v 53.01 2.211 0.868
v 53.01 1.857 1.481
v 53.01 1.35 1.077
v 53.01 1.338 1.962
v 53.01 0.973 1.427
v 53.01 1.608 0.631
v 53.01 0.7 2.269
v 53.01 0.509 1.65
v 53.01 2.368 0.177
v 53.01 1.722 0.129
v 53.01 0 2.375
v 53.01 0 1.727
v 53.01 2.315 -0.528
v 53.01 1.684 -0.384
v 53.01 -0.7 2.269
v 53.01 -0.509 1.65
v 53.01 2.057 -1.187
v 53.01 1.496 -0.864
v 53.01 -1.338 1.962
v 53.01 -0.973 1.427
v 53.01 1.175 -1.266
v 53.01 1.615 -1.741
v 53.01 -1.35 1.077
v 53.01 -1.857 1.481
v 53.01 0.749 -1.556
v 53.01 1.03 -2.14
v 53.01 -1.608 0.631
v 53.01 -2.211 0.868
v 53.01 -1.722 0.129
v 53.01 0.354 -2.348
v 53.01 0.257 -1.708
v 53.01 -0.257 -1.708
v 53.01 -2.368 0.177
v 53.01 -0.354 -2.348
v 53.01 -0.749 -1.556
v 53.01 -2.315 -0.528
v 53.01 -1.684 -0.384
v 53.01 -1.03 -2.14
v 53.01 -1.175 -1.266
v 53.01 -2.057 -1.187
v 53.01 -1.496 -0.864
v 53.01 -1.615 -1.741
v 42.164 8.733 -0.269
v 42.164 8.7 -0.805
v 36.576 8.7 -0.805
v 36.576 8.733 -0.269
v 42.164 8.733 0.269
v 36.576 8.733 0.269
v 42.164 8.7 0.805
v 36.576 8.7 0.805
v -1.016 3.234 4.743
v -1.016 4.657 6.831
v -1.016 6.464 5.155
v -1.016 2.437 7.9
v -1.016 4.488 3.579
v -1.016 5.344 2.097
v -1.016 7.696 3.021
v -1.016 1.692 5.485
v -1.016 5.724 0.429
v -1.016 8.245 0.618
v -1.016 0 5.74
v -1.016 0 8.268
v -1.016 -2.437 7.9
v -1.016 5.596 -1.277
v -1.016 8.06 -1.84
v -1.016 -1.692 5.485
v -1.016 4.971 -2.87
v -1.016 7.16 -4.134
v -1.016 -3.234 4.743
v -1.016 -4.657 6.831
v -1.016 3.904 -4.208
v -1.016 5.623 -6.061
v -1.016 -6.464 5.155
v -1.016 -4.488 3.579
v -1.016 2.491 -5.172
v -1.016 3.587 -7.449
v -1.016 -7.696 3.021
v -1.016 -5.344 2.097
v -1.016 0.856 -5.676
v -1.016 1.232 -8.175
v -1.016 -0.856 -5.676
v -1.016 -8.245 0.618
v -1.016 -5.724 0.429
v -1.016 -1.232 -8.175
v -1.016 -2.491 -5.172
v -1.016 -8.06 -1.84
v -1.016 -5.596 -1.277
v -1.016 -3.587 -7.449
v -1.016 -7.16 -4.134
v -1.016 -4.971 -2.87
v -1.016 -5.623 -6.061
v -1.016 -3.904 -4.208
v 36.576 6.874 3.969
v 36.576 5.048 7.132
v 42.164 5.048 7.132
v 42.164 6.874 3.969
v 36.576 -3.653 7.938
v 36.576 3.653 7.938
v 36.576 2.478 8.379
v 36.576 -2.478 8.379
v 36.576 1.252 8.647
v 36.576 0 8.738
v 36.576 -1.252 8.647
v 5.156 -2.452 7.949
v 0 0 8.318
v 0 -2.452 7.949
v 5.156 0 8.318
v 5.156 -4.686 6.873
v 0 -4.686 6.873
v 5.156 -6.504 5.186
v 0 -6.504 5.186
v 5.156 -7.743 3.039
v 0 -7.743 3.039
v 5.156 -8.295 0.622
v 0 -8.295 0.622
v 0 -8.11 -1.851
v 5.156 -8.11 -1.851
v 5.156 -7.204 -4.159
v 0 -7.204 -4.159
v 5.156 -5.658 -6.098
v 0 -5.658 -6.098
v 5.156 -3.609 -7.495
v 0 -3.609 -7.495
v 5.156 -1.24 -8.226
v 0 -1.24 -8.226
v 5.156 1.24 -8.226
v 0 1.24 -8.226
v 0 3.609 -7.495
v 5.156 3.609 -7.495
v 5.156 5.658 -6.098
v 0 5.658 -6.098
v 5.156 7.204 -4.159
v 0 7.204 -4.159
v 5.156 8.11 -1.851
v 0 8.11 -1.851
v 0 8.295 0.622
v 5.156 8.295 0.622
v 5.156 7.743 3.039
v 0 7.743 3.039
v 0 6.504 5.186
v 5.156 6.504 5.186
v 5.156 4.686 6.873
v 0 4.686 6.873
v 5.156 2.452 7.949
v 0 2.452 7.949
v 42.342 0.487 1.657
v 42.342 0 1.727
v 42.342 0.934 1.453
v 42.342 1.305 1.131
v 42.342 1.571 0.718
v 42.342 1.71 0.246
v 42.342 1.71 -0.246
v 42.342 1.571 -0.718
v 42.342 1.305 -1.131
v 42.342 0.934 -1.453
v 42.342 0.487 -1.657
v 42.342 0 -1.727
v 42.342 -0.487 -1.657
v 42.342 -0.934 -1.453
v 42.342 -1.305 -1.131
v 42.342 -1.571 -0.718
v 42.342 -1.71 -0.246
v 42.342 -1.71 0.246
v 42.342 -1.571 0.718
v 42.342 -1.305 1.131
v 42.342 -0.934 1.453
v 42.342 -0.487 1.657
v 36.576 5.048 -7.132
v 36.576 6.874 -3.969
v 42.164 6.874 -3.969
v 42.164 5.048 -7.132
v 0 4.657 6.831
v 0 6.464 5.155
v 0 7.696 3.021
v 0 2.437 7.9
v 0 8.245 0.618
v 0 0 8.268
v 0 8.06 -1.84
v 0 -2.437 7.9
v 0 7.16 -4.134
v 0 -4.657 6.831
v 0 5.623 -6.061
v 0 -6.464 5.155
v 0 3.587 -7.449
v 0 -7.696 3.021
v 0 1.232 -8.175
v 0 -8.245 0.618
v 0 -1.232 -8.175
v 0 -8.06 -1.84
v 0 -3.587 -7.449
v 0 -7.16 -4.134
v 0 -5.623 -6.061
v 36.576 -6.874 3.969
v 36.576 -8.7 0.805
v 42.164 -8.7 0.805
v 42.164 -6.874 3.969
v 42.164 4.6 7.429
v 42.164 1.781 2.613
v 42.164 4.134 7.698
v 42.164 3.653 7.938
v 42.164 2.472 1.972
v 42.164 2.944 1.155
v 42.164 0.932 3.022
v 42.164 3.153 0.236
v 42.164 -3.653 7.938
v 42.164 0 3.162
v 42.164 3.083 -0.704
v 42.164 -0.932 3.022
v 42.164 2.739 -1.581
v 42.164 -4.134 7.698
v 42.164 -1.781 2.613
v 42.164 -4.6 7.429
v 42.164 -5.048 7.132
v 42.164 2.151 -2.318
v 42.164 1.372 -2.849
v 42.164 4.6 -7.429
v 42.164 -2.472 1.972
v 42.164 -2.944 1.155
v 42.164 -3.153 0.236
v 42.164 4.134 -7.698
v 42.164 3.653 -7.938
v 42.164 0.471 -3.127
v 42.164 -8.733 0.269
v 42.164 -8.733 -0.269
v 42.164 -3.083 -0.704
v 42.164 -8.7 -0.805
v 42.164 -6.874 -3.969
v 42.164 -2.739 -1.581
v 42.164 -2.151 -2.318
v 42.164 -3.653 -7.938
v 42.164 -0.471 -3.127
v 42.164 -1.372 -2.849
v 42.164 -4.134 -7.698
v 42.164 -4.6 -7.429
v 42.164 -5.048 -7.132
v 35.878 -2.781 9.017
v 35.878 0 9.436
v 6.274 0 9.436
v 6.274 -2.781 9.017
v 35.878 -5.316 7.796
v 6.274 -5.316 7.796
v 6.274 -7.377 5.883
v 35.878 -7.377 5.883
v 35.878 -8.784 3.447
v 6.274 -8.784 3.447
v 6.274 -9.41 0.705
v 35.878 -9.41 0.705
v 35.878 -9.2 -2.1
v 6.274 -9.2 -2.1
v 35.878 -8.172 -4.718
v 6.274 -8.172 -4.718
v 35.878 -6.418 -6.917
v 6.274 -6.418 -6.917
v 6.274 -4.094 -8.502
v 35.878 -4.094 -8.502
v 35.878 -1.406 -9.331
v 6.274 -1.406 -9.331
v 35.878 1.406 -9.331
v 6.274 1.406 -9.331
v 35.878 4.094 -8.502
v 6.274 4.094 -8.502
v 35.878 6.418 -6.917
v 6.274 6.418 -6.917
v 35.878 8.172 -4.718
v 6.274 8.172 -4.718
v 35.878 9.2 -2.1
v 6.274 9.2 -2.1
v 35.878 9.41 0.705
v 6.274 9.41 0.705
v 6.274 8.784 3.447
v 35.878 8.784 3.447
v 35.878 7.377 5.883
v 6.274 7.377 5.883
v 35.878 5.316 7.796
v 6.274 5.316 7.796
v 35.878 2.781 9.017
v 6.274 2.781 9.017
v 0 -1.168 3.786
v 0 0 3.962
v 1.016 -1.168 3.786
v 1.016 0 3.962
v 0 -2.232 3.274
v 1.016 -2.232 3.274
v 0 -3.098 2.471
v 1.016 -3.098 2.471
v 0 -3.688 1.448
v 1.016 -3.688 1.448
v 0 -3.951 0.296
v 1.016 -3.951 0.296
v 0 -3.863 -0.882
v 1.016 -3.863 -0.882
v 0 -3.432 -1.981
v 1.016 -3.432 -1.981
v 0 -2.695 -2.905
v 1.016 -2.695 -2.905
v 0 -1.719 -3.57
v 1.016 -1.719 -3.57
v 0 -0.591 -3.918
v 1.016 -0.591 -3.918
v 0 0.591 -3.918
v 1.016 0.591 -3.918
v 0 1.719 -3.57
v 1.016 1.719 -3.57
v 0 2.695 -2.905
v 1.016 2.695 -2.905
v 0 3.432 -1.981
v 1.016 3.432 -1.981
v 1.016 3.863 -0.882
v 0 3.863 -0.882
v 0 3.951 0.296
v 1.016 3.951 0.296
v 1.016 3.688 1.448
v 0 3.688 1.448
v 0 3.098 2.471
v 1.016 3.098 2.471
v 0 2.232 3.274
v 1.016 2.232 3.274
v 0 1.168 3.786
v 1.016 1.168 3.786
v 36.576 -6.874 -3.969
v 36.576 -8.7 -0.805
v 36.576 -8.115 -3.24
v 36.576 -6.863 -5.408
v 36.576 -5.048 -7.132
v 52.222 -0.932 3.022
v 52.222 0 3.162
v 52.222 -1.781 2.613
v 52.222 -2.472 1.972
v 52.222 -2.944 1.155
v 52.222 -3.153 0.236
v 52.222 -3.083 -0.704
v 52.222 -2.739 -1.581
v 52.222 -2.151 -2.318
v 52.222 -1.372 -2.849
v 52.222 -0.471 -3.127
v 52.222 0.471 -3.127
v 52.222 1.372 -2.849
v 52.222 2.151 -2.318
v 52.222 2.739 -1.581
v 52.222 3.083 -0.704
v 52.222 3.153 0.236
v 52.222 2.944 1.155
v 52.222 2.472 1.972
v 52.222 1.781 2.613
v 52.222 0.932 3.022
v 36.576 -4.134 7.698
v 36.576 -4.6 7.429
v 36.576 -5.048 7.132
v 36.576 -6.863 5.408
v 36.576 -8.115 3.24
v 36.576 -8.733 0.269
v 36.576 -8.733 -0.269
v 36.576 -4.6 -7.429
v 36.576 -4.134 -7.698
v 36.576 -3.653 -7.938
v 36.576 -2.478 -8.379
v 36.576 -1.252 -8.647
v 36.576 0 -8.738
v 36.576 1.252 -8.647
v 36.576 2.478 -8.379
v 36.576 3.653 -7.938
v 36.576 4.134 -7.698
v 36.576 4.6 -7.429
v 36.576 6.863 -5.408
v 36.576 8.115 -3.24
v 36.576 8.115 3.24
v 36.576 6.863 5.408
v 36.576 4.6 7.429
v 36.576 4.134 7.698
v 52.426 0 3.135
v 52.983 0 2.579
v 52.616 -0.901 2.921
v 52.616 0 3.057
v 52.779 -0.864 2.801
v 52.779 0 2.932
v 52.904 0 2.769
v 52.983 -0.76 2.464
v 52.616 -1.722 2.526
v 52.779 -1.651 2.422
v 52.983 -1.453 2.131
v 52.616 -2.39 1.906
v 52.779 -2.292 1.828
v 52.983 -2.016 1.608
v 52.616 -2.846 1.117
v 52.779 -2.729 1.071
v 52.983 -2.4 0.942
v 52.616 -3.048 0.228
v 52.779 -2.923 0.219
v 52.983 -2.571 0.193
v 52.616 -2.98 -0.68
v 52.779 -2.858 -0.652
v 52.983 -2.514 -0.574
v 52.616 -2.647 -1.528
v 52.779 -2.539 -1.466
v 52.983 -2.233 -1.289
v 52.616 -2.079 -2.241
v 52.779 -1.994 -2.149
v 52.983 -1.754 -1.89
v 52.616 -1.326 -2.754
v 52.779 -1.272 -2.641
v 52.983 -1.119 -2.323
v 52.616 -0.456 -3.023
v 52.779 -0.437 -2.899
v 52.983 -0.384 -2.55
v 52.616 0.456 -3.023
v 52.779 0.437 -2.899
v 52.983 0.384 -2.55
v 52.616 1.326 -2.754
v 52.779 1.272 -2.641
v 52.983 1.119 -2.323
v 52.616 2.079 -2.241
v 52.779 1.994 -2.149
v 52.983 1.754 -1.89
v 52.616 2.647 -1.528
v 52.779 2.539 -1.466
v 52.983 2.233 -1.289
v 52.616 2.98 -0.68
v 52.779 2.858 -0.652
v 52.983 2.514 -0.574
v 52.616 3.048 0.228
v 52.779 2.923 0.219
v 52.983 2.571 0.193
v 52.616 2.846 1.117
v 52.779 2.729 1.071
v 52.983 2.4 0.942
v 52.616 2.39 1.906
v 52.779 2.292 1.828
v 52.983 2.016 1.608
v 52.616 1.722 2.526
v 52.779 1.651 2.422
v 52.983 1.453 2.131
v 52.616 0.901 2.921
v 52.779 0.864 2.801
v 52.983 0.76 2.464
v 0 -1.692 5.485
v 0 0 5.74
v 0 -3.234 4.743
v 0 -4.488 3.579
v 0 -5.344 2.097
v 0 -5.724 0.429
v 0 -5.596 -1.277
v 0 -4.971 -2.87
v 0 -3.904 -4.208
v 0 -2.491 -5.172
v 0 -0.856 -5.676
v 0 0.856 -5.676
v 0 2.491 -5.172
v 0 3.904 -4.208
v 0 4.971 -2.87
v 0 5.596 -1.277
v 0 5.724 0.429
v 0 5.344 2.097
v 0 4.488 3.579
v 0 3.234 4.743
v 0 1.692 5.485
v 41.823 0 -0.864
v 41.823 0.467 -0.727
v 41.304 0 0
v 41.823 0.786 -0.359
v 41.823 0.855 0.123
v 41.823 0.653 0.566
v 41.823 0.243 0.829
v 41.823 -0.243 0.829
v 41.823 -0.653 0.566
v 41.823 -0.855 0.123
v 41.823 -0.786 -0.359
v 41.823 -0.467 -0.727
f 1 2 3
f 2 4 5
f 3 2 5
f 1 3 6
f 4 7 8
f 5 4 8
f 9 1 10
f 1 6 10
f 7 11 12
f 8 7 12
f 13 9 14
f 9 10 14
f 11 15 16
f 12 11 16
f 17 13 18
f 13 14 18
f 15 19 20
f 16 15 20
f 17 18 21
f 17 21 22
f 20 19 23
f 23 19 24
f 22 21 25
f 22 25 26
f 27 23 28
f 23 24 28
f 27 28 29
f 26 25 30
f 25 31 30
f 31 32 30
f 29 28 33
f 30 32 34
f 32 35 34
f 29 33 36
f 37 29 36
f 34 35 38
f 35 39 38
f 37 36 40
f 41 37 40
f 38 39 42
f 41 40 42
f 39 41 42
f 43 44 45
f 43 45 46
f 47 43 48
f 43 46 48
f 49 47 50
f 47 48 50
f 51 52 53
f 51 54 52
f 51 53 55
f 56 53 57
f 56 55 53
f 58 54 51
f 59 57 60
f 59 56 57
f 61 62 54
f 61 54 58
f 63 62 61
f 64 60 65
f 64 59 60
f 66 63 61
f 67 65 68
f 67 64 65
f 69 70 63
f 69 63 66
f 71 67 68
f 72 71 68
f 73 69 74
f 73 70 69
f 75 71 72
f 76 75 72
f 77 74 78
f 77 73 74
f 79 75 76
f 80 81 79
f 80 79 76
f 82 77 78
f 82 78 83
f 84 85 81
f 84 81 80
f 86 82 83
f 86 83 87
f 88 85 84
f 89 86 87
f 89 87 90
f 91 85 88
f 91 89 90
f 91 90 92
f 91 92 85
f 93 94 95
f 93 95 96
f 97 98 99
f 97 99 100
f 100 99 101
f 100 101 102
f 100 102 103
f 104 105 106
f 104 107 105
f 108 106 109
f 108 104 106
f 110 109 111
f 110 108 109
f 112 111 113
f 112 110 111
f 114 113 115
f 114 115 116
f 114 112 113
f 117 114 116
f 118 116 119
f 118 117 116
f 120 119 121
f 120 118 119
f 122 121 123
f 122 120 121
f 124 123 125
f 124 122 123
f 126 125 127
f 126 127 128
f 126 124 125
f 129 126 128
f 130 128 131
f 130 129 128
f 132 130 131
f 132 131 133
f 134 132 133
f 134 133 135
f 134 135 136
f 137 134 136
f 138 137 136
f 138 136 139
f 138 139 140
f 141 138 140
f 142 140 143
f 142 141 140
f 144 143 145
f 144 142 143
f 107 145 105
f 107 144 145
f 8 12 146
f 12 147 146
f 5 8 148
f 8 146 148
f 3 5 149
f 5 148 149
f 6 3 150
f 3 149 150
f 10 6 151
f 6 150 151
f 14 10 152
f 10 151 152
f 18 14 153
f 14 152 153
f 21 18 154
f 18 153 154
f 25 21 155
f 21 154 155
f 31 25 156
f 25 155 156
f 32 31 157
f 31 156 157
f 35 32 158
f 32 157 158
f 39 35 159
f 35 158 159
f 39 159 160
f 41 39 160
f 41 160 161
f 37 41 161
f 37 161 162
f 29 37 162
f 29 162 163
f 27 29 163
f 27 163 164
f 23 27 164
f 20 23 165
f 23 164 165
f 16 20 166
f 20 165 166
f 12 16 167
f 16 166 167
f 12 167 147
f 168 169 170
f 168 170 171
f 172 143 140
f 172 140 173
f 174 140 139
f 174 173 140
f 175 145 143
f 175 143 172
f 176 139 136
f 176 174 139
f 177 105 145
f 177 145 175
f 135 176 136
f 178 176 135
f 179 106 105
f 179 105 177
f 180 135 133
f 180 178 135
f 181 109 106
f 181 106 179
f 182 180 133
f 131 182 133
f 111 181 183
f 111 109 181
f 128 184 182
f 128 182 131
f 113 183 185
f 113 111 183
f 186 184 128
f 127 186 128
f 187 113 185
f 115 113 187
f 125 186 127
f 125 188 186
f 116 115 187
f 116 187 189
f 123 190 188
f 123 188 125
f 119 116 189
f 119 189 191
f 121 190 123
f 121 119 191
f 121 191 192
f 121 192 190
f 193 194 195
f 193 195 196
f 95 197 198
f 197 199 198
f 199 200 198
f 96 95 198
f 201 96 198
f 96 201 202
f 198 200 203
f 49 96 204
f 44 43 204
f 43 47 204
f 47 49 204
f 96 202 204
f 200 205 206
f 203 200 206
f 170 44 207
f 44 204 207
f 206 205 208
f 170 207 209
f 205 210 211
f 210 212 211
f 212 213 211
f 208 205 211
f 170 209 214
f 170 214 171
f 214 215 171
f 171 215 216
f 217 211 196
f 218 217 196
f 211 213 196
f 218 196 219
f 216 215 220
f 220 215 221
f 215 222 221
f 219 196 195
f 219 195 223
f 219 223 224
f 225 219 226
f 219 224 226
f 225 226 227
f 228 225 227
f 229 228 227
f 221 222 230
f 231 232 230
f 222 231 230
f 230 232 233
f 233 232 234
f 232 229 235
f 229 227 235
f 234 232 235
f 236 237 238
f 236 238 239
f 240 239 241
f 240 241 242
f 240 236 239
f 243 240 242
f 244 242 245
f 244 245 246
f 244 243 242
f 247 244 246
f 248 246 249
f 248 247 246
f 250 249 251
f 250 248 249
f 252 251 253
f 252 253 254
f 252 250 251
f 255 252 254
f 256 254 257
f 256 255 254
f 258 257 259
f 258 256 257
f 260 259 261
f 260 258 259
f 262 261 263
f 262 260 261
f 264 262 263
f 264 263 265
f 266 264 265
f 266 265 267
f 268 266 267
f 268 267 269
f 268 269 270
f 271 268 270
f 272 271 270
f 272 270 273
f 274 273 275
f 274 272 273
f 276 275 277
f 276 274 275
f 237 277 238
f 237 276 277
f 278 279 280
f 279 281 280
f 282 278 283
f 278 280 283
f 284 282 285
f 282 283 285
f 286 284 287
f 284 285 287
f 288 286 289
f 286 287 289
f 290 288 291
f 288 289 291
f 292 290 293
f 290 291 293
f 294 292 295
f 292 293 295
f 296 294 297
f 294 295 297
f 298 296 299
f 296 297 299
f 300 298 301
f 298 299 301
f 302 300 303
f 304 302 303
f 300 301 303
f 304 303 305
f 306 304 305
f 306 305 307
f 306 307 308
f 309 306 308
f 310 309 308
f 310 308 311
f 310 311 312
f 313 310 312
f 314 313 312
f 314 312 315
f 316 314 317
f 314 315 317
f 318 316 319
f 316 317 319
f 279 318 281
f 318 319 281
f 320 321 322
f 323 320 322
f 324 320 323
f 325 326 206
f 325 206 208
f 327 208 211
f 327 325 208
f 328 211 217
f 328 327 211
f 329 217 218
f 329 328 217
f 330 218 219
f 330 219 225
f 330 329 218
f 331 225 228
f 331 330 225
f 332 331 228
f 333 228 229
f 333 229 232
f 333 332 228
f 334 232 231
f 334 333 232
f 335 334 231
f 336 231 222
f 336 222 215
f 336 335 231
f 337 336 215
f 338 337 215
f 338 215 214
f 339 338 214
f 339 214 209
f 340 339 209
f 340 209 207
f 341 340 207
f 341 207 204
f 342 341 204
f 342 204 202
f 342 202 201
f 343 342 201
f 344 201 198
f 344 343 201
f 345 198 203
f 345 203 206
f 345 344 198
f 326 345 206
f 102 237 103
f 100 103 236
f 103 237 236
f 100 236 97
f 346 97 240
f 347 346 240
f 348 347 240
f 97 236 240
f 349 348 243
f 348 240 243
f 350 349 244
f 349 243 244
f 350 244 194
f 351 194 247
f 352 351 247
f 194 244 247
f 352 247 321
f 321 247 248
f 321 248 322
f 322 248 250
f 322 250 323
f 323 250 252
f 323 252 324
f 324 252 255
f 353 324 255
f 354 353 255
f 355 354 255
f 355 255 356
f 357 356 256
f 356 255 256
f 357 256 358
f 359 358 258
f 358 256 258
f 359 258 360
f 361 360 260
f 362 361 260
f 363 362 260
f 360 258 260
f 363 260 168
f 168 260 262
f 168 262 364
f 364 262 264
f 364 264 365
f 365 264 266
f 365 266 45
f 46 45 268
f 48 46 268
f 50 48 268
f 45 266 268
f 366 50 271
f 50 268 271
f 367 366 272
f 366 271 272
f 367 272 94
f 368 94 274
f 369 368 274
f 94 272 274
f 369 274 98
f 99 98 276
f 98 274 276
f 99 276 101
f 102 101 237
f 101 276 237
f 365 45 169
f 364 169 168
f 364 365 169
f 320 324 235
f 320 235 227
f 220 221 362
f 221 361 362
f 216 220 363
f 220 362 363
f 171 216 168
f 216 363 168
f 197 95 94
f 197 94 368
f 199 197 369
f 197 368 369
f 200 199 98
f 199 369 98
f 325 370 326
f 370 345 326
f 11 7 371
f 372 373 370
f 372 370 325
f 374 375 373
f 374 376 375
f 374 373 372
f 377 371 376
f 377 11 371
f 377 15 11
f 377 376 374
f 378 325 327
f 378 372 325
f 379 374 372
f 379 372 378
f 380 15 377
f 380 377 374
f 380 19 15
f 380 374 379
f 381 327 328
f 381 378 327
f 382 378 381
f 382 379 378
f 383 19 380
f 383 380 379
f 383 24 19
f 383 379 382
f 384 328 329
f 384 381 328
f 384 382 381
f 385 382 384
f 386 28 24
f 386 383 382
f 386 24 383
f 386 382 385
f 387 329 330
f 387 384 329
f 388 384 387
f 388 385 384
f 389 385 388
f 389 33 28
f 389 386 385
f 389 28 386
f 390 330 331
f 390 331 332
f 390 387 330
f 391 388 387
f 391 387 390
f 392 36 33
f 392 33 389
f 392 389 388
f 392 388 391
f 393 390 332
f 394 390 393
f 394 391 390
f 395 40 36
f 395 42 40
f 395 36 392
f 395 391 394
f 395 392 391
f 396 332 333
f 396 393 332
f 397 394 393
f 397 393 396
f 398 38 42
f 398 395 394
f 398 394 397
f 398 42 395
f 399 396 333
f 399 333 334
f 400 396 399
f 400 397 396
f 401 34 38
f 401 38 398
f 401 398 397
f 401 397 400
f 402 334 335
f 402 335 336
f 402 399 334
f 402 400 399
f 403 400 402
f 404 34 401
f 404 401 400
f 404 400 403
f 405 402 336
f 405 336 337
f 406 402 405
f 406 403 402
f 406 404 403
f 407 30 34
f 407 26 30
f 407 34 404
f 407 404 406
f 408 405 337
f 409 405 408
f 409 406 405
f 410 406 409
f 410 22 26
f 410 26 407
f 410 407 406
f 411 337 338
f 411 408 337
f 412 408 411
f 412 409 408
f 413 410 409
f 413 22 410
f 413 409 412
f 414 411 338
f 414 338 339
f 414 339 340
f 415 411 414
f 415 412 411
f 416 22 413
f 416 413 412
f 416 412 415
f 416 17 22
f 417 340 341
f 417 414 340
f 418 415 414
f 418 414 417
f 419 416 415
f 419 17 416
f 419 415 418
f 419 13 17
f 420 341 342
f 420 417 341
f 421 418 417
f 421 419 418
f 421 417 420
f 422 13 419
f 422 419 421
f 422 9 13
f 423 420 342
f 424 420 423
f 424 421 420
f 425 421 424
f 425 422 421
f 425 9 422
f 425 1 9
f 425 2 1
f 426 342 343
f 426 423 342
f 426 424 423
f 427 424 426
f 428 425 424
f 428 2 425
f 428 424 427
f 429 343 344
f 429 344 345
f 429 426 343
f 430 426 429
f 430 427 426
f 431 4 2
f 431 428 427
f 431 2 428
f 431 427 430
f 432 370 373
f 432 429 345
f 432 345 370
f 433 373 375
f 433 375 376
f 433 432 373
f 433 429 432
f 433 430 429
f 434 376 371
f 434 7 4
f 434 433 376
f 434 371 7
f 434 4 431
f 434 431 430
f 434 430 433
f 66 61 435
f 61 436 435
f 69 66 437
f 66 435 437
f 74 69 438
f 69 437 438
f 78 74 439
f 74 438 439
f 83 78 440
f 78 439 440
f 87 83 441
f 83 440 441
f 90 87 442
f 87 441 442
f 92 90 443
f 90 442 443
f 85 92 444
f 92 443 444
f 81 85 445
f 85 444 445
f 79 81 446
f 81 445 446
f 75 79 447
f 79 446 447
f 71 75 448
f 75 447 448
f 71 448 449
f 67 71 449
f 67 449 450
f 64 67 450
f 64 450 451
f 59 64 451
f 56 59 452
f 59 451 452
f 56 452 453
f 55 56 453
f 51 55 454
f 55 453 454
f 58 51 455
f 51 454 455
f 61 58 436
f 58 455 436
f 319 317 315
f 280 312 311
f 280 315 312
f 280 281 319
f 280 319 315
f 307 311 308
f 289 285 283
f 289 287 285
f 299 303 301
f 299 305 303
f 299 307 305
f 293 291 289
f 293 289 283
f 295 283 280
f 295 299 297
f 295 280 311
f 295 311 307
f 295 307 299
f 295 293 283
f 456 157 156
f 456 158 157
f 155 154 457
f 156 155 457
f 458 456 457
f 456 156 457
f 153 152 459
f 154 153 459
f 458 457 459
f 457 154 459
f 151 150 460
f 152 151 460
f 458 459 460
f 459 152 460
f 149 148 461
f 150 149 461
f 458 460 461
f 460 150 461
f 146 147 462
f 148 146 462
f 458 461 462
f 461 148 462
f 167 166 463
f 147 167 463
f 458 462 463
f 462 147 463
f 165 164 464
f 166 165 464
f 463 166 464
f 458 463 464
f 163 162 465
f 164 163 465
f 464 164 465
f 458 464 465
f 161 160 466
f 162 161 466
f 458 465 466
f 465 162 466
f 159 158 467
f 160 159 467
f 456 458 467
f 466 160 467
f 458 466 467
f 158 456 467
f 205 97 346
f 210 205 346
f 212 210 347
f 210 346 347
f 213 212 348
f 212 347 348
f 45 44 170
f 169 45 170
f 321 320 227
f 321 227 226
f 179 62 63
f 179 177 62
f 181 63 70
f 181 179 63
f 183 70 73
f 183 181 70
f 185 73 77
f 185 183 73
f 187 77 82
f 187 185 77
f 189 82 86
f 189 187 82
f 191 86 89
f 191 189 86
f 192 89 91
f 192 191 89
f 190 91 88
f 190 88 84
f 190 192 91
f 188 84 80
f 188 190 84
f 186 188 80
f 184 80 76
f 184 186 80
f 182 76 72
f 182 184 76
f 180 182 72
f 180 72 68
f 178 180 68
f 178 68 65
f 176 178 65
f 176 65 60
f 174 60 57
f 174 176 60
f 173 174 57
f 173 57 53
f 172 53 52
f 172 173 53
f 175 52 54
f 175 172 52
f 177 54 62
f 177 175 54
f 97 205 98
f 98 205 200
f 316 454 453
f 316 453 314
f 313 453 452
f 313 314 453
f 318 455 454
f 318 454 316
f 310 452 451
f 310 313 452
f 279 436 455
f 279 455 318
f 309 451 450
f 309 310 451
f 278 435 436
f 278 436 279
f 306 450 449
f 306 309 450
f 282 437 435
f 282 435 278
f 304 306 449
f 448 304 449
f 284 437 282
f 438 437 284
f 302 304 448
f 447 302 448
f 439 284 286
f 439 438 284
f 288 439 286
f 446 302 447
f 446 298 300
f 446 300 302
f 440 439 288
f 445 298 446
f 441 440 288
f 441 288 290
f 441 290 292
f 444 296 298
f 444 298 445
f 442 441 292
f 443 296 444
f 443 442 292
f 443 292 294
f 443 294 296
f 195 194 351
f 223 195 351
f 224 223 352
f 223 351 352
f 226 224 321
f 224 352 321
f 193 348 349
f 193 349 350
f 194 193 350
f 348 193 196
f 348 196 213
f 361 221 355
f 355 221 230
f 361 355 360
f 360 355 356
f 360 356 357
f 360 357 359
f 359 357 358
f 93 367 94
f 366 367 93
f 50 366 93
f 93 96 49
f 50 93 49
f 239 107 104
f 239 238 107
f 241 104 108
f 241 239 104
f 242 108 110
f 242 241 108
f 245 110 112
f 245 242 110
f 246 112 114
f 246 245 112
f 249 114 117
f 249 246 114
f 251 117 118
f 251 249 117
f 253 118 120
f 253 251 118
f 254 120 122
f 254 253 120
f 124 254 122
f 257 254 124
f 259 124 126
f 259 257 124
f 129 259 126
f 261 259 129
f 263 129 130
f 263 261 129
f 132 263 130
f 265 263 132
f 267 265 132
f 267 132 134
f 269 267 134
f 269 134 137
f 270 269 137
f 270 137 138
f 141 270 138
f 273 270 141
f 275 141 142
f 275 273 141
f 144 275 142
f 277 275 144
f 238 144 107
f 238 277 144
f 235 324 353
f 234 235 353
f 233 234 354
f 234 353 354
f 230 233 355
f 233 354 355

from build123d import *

# Parameters (mm, degrees)
SKETCH1_W                 = 42.164
SKETCH1_H                 = 9.4361
SKETCH2_W                 = 1.016
SKETCH2_H                 = 3.9624
CUT_EXTRUDE1_DEPTH        = 5.588
SKETCH6_W                 = 10.8458
SKETCH6_H                 = 3.1623
FILLET1_R                 = 0.7874
F_8_32_TAPPED_HOLE1_D     = 3.4544
F_8_32_TAPPED_HOLE1_DEPTH = 10.668
F_8_32_TAPPED_HOLE1_TIP   = 1.037806461
SKETCH12_W                = 1.016
SKETCH12_H                = 2.5273


with BuildPart() as part:
    # Sketch1 → Revolve1 (revolve)
    with BuildSketch(Plane.XY, mode=Mode.PRIVATE) as revolve1_sk:
        with Locations((21.082, 4.71805)):
            Rectangle(SKETCH1_W, SKETCH1_H)
    revolve(revolve1_sk.sketch.rotate(Axis((-25.954653295, 0, 0), (1, 0, 0)), 90), axis=Axis((-25.954653295, 0, 0), (1, 0, 0)))  # turned: the seam where the file's is

    # Sketch2 → Cut-Revolve1 (revolve, cut)
    with BuildSketch(Plane.XY, mode=Mode.PRIVATE) as cut_revolve1_sk:
        with Locations((0.508, 1.9812)):
            Rectangle(SKETCH2_W, SKETCH2_H)
    revolve(cut_revolve1_sk.sketch.rotate(Axis((-4.423867111, 0, 0), (1, 0, 0)), 90), axis=Axis((-4.423867111, 0, 0), (1, 0, 0)), mode=Mode.SUBTRACT)  # turned: the seam where the file's is

    # Sketch3 → Cut-Revolve2 (revolve, cut)
    with BuildSketch(Plane.XY, mode=Mode.PRIVATE) as cut_revolve2_sk:
        Polygon((0, 8.3185), (5.1562, 8.3185), (6.2738, 9.4361), (0, 9.4361), align=None)
    revolve(cut_revolve2_sk.sketch.rotate(Axis((-2.146557548, 0, 0), (1, 0, 0)), 90), axis=Axis((-2.146557548, 0, 0), (1, 0, 0)), mode=Mode.SUBTRACT)  # turned: the seam where the file's is

    # Sketch4 → Cut-Revolve3 (revolve, cut)
    with BuildSketch(Plane.XY, mode=Mode.PRIVATE) as cut_revolve3_sk:
        Polygon((42.164, 8.7376), (36.576, 8.7376), (35.8775, 9.4361), (42.164, 9.4361), align=None)
    revolve(cut_revolve3_sk.sketch.rotate(Axis((-3.32735082, 0, 0), (1, 0, 0)), 90), axis=Axis((-3.32735082, 0, 0), (1, 0, 0)), mode=Mode.SUBTRACT)  # turned: the seam where the file's is

    # Sketch5 → Cut-Extrude1 (cut)
    with BuildSketch(Plane(origin=(42.164, 0, 0), x_dir=(0, 0, -1), z_dir=(1, 0, 0))):
        with BuildLine():
            Line((-7.9375, -3.652635694), (-7.9375, 0))
            Line((-7.9375, 0), (-7.9375, 3.652635694))
            ThreePointArc((-7.9375, 3.652635694), (-8.7376, 0), (-7.9375, -3.652635694))
        make_face()
        with BuildLine():
            Line((-3.96875004, 6.874076619), (-0.805474699, 8.700394489))
            ThreePointArc((-0.805474699, 8.700394489), (-4.3688, 7.566983568), (-7.132025301, 5.047758796))
            Line((-7.132025301, 5.047758796), (-3.96875004, 6.874076619))
        make_face()
        with BuildLine():
            ThreePointArc((7.132025301, 5.047758796), (4.3688, 7.566983568), (0.805474699, 8.700394489))
            Line((0.805474699, 8.700394489), (3.968749933, 6.874076681))
            Line((3.968749933, 6.874076681), (7.132025301, 5.047758796))
        make_face()
        with BuildLine():
            Line((7.9375, 3.652635694), (7.9375, 0))
            Line((7.9375, 0), (7.9375, -3.652635694))
            ThreePointArc((7.9375, -3.652635694), (8.535231507, -1.869619448), (8.7376, 0))
            ThreePointArc((8.7376, 0), (8.535231507, 1.869619448), (7.9375, 3.652635694))
        make_face()
        with BuildLine():
            Line((7.132025301, -5.047758796), (3.968749899, -6.874076701))
            Line((3.968749899, -6.874076701), (0.805474699, -8.700394489))
            ThreePointArc((0.805474699, -8.700394489), (4.3688, -7.566983568), (7.132025301, -5.047758796))
        make_face()
        with BuildLine():
            Line((-0.805474699, -8.700394489), (-3.96875004, -6.874076619))
            Line((-3.96875004, -6.874076619), (-7.132025301, -5.047758796))
            ThreePointArc((-7.132025301, -5.047758796), (-4.3688, -7.566983568), (-0.805474699, -8.700394489))
        make_face()
    extrude(amount=-CUT_EXTRUDE1_DEPTH, mode=Mode.SUBTRACT)

    # Sketch6 → Revolve3 (revolve)
    with BuildSketch(Plane.XY, mode=Mode.PRIVATE) as revolve3_sk:
        with Locations((47.5869, 1.58115)):
            Rectangle(SKETCH6_W, SKETCH6_H)
    revolve(revolve3_sk.sketch.rotate(Axis((-1.691095635, 0, 0), (1, 0, 0)), 90), axis=Axis((-1.691095635, 0, 0), (1, 0, 0)))  # turned: the seam where the file's is

    # Fillet1
    fillet1_edges = [part.edges().sort_by_distance(p)[0] for p in [
        (53.0098, 0, -3.1623),
    ]]
    fillet(fillet1_edges, radius=FILLET1_R)

    # #8-32 Tapped Hole1
    with Locations(Plane(origin=(53.0098, 0, 0), x_dir=(0, 0, -1), z_dir=(1, 0, 0))):
        with Locations((0, 0)):
            Hole(F_8_32_TAPPED_HOLE1_D / 2, depth=F_8_32_TAPPED_HOLE1_DEPTH)
            with Locations((0, 0, -(F_8_32_TAPPED_HOLE1_DEPTH + F_8_32_TAPPED_HOLE1_TIP / 2))):  # 118° drill point
                Cone(0, F_8_32_TAPPED_HOLE1_D / 2, F_8_32_TAPPED_HOLE1_TIP, mode=Mode.SUBTRACT)

    # Sketch12 → Revolve4 (revolve)
    with BuildSketch(Plane.XY, mode=Mode.PRIVATE) as revolve4_sk:
        with Locations((-0.508, 7.00405)):
            Rectangle(SKETCH12_W, SKETCH12_H)
    revolve(revolve4_sk.sketch.rotate(Axis((-4.807110581, 0, 0), (1, 0, 0)), 90), axis=Axis((-4.807110581, 0, 0), (1, 0, 0)))  # turned: the seam where the file's is


solid = part.part
